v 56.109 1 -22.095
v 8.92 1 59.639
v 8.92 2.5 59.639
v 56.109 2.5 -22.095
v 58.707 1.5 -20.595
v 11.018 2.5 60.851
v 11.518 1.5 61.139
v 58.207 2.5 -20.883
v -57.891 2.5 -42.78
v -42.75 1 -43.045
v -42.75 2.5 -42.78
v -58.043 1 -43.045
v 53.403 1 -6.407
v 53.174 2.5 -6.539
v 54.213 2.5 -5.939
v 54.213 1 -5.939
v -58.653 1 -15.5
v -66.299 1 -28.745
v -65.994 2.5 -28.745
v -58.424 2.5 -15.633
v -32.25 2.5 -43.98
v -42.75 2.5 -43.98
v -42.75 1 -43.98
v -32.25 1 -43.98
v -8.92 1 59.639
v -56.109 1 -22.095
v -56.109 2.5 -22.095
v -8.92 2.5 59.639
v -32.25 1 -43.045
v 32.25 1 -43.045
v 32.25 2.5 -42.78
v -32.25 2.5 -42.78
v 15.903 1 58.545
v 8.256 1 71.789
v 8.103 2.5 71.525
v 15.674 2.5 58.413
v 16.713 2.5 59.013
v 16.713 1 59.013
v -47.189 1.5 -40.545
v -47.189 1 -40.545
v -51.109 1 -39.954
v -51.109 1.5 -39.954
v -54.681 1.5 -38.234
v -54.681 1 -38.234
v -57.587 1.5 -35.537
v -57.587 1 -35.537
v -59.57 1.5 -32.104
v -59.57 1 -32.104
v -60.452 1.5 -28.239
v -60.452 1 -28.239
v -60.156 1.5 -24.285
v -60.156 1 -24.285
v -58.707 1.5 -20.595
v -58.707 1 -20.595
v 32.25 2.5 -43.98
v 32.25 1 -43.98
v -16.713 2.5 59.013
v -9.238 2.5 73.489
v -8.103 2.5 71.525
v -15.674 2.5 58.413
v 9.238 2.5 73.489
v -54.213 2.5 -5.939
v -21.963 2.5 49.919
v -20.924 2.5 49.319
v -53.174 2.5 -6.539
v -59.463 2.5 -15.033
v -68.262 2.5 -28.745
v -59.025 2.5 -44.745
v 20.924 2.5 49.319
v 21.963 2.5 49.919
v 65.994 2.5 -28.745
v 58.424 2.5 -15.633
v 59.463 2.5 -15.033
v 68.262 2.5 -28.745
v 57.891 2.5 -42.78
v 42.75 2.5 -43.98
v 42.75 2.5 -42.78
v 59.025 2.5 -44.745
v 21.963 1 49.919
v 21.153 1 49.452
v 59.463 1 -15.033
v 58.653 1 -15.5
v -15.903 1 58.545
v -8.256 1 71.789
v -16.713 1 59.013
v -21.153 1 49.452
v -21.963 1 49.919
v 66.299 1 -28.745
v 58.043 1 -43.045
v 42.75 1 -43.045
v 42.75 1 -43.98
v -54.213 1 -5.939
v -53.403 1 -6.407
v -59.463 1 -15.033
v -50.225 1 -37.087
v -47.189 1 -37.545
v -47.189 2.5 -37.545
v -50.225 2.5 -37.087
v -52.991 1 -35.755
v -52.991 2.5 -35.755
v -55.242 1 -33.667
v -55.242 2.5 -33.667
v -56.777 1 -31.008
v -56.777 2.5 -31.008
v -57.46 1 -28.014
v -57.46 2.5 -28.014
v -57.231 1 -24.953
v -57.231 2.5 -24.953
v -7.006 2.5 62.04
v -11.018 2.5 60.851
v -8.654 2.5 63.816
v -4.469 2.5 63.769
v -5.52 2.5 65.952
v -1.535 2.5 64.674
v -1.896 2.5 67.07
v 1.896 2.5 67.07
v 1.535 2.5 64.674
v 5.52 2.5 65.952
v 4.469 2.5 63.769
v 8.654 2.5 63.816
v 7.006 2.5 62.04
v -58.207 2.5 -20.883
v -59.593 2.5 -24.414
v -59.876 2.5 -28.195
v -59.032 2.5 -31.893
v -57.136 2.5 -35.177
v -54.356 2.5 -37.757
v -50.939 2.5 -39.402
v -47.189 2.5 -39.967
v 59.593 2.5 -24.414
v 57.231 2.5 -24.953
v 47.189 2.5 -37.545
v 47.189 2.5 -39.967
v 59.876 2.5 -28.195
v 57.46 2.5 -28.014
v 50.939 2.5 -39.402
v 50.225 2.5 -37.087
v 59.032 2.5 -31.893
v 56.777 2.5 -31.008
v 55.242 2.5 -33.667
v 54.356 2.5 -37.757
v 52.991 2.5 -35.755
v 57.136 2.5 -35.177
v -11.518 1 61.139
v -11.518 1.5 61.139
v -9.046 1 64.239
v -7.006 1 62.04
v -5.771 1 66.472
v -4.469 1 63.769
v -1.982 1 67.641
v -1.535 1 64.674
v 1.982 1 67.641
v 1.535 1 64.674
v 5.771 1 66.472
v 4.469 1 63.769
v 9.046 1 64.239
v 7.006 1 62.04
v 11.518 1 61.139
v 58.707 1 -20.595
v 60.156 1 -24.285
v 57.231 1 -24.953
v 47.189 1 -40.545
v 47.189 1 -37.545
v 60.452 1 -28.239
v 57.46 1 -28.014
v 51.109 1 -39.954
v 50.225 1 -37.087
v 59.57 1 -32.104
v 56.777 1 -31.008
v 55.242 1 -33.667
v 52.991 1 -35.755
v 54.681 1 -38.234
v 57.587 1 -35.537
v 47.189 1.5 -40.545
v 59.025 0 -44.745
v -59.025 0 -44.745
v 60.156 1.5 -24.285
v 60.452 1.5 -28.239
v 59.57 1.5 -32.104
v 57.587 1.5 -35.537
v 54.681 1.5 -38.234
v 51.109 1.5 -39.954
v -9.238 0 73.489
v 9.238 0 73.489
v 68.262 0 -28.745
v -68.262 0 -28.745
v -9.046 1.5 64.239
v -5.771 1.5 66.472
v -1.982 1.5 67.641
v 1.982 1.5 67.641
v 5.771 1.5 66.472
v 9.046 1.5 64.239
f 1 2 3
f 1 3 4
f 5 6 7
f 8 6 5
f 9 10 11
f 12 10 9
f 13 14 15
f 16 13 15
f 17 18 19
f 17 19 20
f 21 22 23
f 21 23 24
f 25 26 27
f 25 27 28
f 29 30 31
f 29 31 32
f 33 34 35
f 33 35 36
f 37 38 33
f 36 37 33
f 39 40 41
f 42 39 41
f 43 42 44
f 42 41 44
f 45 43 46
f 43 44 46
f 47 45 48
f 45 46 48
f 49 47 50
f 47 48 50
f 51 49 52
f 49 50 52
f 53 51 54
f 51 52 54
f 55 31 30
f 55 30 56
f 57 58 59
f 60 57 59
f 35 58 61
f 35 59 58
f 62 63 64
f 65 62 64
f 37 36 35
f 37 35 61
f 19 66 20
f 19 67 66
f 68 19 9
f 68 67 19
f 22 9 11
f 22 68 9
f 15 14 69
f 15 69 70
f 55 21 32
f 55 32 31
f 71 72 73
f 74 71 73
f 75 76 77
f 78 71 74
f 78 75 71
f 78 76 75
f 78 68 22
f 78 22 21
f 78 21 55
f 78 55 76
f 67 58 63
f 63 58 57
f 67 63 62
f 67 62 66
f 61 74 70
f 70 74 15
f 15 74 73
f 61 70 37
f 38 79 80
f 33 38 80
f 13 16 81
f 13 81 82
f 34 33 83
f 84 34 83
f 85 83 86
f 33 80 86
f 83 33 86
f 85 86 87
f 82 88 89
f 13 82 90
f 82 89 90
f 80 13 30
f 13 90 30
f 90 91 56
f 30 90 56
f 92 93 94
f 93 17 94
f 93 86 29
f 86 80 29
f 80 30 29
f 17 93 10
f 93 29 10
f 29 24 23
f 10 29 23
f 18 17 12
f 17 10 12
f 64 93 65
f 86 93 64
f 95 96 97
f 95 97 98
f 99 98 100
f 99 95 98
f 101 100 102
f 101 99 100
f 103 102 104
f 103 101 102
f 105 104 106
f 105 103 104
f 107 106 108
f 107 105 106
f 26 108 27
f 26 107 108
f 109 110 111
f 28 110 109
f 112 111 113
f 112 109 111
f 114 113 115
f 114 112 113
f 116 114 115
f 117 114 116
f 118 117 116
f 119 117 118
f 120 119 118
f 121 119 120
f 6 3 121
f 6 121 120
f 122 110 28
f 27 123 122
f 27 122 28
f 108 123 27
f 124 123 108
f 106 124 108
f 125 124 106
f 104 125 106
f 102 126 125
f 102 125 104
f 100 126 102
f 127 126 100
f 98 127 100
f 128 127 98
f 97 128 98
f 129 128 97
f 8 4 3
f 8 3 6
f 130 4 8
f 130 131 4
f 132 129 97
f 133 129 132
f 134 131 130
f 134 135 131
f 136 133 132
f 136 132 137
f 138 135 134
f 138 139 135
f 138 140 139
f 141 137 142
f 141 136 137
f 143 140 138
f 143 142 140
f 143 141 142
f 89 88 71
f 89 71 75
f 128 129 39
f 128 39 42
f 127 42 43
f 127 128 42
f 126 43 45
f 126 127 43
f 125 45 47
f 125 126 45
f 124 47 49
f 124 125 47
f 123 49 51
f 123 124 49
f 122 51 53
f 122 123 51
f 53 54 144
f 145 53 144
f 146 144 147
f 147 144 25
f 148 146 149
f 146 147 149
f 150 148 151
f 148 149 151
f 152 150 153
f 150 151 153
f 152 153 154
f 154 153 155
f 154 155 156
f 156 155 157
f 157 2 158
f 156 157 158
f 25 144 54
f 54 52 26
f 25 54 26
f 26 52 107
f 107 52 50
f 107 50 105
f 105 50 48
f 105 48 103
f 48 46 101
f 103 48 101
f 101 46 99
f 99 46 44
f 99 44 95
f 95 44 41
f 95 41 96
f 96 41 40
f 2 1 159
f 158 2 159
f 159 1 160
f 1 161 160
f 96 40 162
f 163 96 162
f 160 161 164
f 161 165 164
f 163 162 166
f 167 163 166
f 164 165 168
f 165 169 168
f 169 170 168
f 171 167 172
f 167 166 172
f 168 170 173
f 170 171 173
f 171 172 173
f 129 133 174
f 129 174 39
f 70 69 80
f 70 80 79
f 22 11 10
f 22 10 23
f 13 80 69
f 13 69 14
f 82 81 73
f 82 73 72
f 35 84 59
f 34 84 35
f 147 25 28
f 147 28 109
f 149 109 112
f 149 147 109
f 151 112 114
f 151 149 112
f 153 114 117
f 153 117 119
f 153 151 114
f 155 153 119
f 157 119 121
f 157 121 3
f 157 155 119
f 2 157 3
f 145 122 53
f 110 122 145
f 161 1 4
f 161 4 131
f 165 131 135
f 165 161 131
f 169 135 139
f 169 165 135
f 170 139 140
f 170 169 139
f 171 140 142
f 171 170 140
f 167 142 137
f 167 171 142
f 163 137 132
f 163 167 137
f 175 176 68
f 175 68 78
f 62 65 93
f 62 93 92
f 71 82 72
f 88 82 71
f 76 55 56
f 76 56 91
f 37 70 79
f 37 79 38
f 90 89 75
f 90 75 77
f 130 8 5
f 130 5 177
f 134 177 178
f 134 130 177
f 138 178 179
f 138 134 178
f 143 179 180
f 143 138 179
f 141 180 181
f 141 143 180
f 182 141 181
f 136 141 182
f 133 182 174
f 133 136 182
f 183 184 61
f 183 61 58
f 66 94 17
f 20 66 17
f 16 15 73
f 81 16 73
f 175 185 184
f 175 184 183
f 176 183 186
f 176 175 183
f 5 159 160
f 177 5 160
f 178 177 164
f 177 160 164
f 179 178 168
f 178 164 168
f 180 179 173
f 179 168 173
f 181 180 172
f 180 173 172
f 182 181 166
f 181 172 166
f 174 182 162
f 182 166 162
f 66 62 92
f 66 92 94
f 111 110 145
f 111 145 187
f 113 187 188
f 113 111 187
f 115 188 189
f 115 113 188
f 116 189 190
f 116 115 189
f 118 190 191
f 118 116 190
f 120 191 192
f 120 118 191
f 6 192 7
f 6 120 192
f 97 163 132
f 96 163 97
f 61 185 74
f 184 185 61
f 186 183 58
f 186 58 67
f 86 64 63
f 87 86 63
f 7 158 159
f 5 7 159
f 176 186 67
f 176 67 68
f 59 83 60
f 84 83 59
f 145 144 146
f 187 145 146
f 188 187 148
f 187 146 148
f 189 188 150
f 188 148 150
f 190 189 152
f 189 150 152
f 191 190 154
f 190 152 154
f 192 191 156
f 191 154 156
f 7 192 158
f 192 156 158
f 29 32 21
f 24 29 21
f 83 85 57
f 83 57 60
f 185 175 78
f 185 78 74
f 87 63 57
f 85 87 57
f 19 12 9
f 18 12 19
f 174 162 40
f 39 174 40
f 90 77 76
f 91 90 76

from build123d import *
from OCP.BRepFilletAPI import BRepFilletAPI_MakeChamfer

# Parameters (mm, degrees)
BOSS_EXTRU_2_DEPTH              = 1
EXTRU_MINCE1_DEPTH              = 1.5
EXTRU_MINCE1_DRAFT              = -10
ENL_V_DE_MAT_EXTRU_MINCE1_DEPTH = 101.734373448
ESQUISSE10_W                    = 10.5
ESQUISSE10_H                    = 4.277647959
ENL_V_MAT_EXTRU_1_DEPTH         = 1.5
EXTRU_MINCE2_DEPTH              = 1.5
CHANFREIN1_SIZE                 = 1
CHANFREIN1_SIZE2                = 0.577350269


with BuildPart() as part:
    # Esquisse2 → Boss.-Extru.2 (new body)
    with BuildSketch(Plane(origin=(0, 0, 0), x_dir=(1, 0, 0), z_dir=(0, 1, 0))):
        Polygon((-68.262395693, 28.744645862), (-59.024791386, 44.744645862), (59.024791386, 44.744645862), (68.262395693, 28.744645862), (9.237604307, -73.489291724), (-9.237604307, -73.489291724), align=None)
    extrude(amount=BOSS_EXTRU_2_DEPTH)


with BuildPart() as extru_mince1_tool:
    # Esquisse5 → Extru.-Mince1 (with draft: the straight prism first)
    with BuildSketch(Plane(origin=(0, 1, 0), x_dir=(1, 0, 0), z_dir=(0, 1, 0))):
        Polygon((-68.262395693, 28.744645862), (-9.237604307, -73.489291724), (9.237604307, -73.489291724), (68.262395693, 28.744645862), (59.024791386, 44.744645862), (-59.024791386, 44.744645862), align=None)
        Polygon((-66.299404778, 28.744645862), (-8.256108849, -71.789291724), (8.256108849, -71.789291724), (66.299404778, 28.744645862), (58.043295928, 43.044645862), (-58.043295928, 43.044645862), align=None, mode=Mode.SUBTRACT)
    extrude(amount=EXTRU_MINCE1_DEPTH)
    # Extru.-Mince1: the draft: its side faces are tilted about the plane it starts from
    extru_mince1_sides = [extru_mince1_tool.faces().sort_by_distance(p)[0] for p in [
        (-38.75, 1.75, 22.372322931),
        (0, 1.75, 73.489291724),
        (38.75, 1.75, 22.372322931),
        (63.643593539, 1.75, -36.744645862),
        (0, 1.75, -44.744645862),
        (-63.643593539, 1.75, -36.744645862),
        (-62.171350353, 1.75, -35.894645862),
        (0, 1.75, -43.044645862),
        (62.171350353, 1.75, -35.894645862),
        (37.277756814, 1.75, 21.522322931),
        (0, 1.75, 71.789291724),
        (-37.277756814, 1.75, 21.522322931),
    ]]
    draft(extru_mince1_sides, Plane(origin=(0, 1, 0), x_dir=(1, 0, 0), z_dir=(0, 1, 0)), EXTRU_MINCE1_DRAFT)


with BuildPart() as part_1:
    add(part.part)

    # Extru.-Mince1: add extru_mince1_tool
    add(extru_mince1_tool.part)

    # Esquisse6 → Enlèv. de mat.-Extru.-Mince1 (cut, through all)
    with BuildSketch(Plane.XZ):
        Polygon((-59.89081679, -46.244645862), (59.89081679, -46.244645862), (69.994446501, -28.744645862), (10.103629711, 74.989291724), (-10.103629711, 74.989291724), (-69.994446501, -28.744645862), align=None)
        Polygon((-59.024791386, -44.744645862), (59.024791386, -44.744645862), (68.262395693, -28.744645862), (9.237604307, 73.489291724), (-9.237604307, 73.489291724), (-68.262395693, -28.744645862), align=None, mode=Mode.SUBTRACT)
    extrude(amount=-ENL_V_DE_MAT_EXTRU_MINCE1_DEPTH, mode=Mode.SUBTRACT)

    # Esquisse10 → Enlèv. mat.-Extru.1 (cut)
    with BuildSketch(Plane(origin=(0, 2.5, 0), x_dir=(1, 0, 0), z_dir=(0, 1, 0))):
        with Locations((-37.5, 41.841331412)):
            Rectangle(ESQUISSE10_W, ESQUISSE10_H)
        with Locations((37.5, 41.841331412)):
            Rectangle(ESQUISSE10_W, ESQUISSE10_H)
        Polygon((54.212931831, 5.939241576), (59.462931831, 15.032508316), (55.75838003, 17.171332296), (50.50838003, 8.078065556), align=None)
        Polygon((16.712931831, -59.012663707), (13.00838003, -56.873839728), (18.25838003, -47.780572988), (21.962931831, -49.919396968), align=None)
        Polygon((-21.962931831, -49.919396968), (-16.712931831, -59.012663707), (-13.00838003, -56.873839728), (-18.25838003, -47.780572988), align=None)
        Polygon((-59.462931831, 15.032508316), (-55.75838003, 17.171332296), (-50.50838003, 8.078065556), (-54.212931831, 5.939241576), align=None)
    extrude(amount=-ENL_V_MAT_EXTRU_1_DEPTH, mode=Mode.SUBTRACT)


with BuildPart() as body_2:
    # Esquisse11 → Extru.-Mince2 (new body)
    with BuildSketch(Plane(origin=(0, 1, 0), x_dir=(1, 0, 0), z_dir=(0, 1, 0))):
        with BuildLine():
            Line((-58.707248738, 20.594645862), (-11.51813787, -61.139291724))
            ThreePointArc((-11.51813787, -61.139291724), (0, -67.789291724), (11.51813787, -61.139291724))
            Line((11.51813787, -61.139291724), (58.707248738, 20.594645862))
            ThreePointArc((58.707248738, 20.594645862), (58.707248738, 33.894645862), (47.189110868, 40.544645862))
            Line((47.189110868, 40.544645862), (-47.189110868, 40.544645862))
            ThreePointArc((-47.189110868, 40.544645862), (-58.707248738, 33.894645862), (-58.707248738, 20.594645862))
        make_face()
        with BuildLine():
            Line((-56.109172527, 22.094645862), (-8.920061659, -59.639291724))
            ThreePointArc((-8.920061659, -59.639291724), (0, -64.789291724), (8.920061659, -59.639291724))
            Line((8.920061659, -59.639291724), (56.109172527, 22.094645862))
            ThreePointArc((56.109172527, 22.094645862), (56.109172527, 32.394645862), (47.189110868, 37.544645862))
            Line((47.189110868, 37.544645862), (-47.189110868, 37.544645862))
            ThreePointArc((-47.189110868, 37.544645862), (-56.109172527, 32.394645862), (-56.109172527, 22.094645862))
        make_face(mode=Mode.SUBTRACT)
    extrude(amount=EXTRU_MINCE2_DEPTH)

    # Chanfrein1: one chamfer whose edges measure the first distance from different faces: ONE call of the kernel's chamfer builder (chamfer() names one face for all edges)
    chanfrein1_edges_1 = [body_2.edges().sort_by_distance(p)[0] for p in [
        (35.112693304, 2.5, 20.272322931),
    ]]
    chanfrein1_side_1 = [body_2.faces().sort_by_distance(p)[0] for p in [
        (35.112693304, 1.75, 20.272322931),
    ]]
    chanfrein1_edges_2 = [body_2.edges().sort_by_distance(p)[0] for p in [
        (58.707248738, 2.5, -33.894645862),
    ]]
    chanfrein1_side_2 = [body_2.faces().sort_by_distance(p)[0] for p in [
        (58.707248738, 1.75, -33.894645862),
    ]]
    chanfrein1_edges_3 = [body_2.edges().sort_by_distance(p)[0] for p in [
        (0, 2.5, -40.544645862),
    ]]
    chanfrein1_side_3 = [body_2.faces().sort_by_distance(p)[0] for p in [
        (0, 1.75, -40.544645862),
    ]]
    chanfrein1_edges_4 = [body_2.edges().sort_by_distance(p)[0] for p in [
        (-58.707248738, 2.5, -33.894645862),
    ]]
    chanfrein1_side_4 = [body_2.faces().sort_by_distance(p)[0] for p in [
        (-58.707248738, 1.75, -33.894645862),
    ]]
    chanfrein1_edges_5 = [body_2.edges().sort_by_distance(p)[0] for p in [
        (-35.112693304, 2.5, 20.272322931),
    ]]
    chanfrein1_side_5 = [body_2.faces().sort_by_distance(p)[0] for p in [
        (-35.112693304, 1.75, 20.272322931),
    ]]
    chanfrein1_edges_6 = [body_2.edges().sort_by_distance(p)[0] for p in [
        (0, 2.5, 67.789291724),
    ]]
    chanfrein1_side_6 = [body_2.faces().sort_by_distance(p)[0] for p in [
        (0, 1.75, 67.789291724),
    ]]
    chanfrein1 = BRepFilletAPI_MakeChamfer(body_2.part.solid().wrapped)
    for e in chanfrein1_edges_1:
        chanfrein1.Add(CHANFREIN1_SIZE, CHANFREIN1_SIZE2, e.wrapped, chanfrein1_side_1[0].wrapped)  # the first distance lies on this face
    for e in chanfrein1_edges_2:
        chanfrein1.Add(CHANFREIN1_SIZE, CHANFREIN1_SIZE2, e.wrapped, chanfrein1_side_2[0].wrapped)  # the first distance lies on this face
    for e in chanfrein1_edges_3:
        chanfrein1.Add(CHANFREIN1_SIZE, CHANFREIN1_SIZE2, e.wrapped, chanfrein1_side_3[0].wrapped)  # the first distance lies on this face
    for e in chanfrein1_edges_4:
        chanfrein1.Add(CHANFREIN1_SIZE, CHANFREIN1_SIZE2, e.wrapped, chanfrein1_side_4[0].wrapped)  # the first distance lies on this face
    for e in chanfrein1_edges_5:
        chanfrein1.Add(CHANFREIN1_SIZE, CHANFREIN1_SIZE2, e.wrapped, chanfrein1_side_5[0].wrapped)  # the first distance lies on this face
    for e in chanfrein1_edges_6:
        chanfrein1.Add(CHANFREIN1_SIZE, CHANFREIN1_SIZE2, e.wrapped, chanfrein1_side_6[0].wrapped)  # the first distance lies on this face
    add(Compound.cast(chanfrein1.Shape()), mode=Mode.REPLACE)


solid = Compound([part_1.part, body_2.part])
